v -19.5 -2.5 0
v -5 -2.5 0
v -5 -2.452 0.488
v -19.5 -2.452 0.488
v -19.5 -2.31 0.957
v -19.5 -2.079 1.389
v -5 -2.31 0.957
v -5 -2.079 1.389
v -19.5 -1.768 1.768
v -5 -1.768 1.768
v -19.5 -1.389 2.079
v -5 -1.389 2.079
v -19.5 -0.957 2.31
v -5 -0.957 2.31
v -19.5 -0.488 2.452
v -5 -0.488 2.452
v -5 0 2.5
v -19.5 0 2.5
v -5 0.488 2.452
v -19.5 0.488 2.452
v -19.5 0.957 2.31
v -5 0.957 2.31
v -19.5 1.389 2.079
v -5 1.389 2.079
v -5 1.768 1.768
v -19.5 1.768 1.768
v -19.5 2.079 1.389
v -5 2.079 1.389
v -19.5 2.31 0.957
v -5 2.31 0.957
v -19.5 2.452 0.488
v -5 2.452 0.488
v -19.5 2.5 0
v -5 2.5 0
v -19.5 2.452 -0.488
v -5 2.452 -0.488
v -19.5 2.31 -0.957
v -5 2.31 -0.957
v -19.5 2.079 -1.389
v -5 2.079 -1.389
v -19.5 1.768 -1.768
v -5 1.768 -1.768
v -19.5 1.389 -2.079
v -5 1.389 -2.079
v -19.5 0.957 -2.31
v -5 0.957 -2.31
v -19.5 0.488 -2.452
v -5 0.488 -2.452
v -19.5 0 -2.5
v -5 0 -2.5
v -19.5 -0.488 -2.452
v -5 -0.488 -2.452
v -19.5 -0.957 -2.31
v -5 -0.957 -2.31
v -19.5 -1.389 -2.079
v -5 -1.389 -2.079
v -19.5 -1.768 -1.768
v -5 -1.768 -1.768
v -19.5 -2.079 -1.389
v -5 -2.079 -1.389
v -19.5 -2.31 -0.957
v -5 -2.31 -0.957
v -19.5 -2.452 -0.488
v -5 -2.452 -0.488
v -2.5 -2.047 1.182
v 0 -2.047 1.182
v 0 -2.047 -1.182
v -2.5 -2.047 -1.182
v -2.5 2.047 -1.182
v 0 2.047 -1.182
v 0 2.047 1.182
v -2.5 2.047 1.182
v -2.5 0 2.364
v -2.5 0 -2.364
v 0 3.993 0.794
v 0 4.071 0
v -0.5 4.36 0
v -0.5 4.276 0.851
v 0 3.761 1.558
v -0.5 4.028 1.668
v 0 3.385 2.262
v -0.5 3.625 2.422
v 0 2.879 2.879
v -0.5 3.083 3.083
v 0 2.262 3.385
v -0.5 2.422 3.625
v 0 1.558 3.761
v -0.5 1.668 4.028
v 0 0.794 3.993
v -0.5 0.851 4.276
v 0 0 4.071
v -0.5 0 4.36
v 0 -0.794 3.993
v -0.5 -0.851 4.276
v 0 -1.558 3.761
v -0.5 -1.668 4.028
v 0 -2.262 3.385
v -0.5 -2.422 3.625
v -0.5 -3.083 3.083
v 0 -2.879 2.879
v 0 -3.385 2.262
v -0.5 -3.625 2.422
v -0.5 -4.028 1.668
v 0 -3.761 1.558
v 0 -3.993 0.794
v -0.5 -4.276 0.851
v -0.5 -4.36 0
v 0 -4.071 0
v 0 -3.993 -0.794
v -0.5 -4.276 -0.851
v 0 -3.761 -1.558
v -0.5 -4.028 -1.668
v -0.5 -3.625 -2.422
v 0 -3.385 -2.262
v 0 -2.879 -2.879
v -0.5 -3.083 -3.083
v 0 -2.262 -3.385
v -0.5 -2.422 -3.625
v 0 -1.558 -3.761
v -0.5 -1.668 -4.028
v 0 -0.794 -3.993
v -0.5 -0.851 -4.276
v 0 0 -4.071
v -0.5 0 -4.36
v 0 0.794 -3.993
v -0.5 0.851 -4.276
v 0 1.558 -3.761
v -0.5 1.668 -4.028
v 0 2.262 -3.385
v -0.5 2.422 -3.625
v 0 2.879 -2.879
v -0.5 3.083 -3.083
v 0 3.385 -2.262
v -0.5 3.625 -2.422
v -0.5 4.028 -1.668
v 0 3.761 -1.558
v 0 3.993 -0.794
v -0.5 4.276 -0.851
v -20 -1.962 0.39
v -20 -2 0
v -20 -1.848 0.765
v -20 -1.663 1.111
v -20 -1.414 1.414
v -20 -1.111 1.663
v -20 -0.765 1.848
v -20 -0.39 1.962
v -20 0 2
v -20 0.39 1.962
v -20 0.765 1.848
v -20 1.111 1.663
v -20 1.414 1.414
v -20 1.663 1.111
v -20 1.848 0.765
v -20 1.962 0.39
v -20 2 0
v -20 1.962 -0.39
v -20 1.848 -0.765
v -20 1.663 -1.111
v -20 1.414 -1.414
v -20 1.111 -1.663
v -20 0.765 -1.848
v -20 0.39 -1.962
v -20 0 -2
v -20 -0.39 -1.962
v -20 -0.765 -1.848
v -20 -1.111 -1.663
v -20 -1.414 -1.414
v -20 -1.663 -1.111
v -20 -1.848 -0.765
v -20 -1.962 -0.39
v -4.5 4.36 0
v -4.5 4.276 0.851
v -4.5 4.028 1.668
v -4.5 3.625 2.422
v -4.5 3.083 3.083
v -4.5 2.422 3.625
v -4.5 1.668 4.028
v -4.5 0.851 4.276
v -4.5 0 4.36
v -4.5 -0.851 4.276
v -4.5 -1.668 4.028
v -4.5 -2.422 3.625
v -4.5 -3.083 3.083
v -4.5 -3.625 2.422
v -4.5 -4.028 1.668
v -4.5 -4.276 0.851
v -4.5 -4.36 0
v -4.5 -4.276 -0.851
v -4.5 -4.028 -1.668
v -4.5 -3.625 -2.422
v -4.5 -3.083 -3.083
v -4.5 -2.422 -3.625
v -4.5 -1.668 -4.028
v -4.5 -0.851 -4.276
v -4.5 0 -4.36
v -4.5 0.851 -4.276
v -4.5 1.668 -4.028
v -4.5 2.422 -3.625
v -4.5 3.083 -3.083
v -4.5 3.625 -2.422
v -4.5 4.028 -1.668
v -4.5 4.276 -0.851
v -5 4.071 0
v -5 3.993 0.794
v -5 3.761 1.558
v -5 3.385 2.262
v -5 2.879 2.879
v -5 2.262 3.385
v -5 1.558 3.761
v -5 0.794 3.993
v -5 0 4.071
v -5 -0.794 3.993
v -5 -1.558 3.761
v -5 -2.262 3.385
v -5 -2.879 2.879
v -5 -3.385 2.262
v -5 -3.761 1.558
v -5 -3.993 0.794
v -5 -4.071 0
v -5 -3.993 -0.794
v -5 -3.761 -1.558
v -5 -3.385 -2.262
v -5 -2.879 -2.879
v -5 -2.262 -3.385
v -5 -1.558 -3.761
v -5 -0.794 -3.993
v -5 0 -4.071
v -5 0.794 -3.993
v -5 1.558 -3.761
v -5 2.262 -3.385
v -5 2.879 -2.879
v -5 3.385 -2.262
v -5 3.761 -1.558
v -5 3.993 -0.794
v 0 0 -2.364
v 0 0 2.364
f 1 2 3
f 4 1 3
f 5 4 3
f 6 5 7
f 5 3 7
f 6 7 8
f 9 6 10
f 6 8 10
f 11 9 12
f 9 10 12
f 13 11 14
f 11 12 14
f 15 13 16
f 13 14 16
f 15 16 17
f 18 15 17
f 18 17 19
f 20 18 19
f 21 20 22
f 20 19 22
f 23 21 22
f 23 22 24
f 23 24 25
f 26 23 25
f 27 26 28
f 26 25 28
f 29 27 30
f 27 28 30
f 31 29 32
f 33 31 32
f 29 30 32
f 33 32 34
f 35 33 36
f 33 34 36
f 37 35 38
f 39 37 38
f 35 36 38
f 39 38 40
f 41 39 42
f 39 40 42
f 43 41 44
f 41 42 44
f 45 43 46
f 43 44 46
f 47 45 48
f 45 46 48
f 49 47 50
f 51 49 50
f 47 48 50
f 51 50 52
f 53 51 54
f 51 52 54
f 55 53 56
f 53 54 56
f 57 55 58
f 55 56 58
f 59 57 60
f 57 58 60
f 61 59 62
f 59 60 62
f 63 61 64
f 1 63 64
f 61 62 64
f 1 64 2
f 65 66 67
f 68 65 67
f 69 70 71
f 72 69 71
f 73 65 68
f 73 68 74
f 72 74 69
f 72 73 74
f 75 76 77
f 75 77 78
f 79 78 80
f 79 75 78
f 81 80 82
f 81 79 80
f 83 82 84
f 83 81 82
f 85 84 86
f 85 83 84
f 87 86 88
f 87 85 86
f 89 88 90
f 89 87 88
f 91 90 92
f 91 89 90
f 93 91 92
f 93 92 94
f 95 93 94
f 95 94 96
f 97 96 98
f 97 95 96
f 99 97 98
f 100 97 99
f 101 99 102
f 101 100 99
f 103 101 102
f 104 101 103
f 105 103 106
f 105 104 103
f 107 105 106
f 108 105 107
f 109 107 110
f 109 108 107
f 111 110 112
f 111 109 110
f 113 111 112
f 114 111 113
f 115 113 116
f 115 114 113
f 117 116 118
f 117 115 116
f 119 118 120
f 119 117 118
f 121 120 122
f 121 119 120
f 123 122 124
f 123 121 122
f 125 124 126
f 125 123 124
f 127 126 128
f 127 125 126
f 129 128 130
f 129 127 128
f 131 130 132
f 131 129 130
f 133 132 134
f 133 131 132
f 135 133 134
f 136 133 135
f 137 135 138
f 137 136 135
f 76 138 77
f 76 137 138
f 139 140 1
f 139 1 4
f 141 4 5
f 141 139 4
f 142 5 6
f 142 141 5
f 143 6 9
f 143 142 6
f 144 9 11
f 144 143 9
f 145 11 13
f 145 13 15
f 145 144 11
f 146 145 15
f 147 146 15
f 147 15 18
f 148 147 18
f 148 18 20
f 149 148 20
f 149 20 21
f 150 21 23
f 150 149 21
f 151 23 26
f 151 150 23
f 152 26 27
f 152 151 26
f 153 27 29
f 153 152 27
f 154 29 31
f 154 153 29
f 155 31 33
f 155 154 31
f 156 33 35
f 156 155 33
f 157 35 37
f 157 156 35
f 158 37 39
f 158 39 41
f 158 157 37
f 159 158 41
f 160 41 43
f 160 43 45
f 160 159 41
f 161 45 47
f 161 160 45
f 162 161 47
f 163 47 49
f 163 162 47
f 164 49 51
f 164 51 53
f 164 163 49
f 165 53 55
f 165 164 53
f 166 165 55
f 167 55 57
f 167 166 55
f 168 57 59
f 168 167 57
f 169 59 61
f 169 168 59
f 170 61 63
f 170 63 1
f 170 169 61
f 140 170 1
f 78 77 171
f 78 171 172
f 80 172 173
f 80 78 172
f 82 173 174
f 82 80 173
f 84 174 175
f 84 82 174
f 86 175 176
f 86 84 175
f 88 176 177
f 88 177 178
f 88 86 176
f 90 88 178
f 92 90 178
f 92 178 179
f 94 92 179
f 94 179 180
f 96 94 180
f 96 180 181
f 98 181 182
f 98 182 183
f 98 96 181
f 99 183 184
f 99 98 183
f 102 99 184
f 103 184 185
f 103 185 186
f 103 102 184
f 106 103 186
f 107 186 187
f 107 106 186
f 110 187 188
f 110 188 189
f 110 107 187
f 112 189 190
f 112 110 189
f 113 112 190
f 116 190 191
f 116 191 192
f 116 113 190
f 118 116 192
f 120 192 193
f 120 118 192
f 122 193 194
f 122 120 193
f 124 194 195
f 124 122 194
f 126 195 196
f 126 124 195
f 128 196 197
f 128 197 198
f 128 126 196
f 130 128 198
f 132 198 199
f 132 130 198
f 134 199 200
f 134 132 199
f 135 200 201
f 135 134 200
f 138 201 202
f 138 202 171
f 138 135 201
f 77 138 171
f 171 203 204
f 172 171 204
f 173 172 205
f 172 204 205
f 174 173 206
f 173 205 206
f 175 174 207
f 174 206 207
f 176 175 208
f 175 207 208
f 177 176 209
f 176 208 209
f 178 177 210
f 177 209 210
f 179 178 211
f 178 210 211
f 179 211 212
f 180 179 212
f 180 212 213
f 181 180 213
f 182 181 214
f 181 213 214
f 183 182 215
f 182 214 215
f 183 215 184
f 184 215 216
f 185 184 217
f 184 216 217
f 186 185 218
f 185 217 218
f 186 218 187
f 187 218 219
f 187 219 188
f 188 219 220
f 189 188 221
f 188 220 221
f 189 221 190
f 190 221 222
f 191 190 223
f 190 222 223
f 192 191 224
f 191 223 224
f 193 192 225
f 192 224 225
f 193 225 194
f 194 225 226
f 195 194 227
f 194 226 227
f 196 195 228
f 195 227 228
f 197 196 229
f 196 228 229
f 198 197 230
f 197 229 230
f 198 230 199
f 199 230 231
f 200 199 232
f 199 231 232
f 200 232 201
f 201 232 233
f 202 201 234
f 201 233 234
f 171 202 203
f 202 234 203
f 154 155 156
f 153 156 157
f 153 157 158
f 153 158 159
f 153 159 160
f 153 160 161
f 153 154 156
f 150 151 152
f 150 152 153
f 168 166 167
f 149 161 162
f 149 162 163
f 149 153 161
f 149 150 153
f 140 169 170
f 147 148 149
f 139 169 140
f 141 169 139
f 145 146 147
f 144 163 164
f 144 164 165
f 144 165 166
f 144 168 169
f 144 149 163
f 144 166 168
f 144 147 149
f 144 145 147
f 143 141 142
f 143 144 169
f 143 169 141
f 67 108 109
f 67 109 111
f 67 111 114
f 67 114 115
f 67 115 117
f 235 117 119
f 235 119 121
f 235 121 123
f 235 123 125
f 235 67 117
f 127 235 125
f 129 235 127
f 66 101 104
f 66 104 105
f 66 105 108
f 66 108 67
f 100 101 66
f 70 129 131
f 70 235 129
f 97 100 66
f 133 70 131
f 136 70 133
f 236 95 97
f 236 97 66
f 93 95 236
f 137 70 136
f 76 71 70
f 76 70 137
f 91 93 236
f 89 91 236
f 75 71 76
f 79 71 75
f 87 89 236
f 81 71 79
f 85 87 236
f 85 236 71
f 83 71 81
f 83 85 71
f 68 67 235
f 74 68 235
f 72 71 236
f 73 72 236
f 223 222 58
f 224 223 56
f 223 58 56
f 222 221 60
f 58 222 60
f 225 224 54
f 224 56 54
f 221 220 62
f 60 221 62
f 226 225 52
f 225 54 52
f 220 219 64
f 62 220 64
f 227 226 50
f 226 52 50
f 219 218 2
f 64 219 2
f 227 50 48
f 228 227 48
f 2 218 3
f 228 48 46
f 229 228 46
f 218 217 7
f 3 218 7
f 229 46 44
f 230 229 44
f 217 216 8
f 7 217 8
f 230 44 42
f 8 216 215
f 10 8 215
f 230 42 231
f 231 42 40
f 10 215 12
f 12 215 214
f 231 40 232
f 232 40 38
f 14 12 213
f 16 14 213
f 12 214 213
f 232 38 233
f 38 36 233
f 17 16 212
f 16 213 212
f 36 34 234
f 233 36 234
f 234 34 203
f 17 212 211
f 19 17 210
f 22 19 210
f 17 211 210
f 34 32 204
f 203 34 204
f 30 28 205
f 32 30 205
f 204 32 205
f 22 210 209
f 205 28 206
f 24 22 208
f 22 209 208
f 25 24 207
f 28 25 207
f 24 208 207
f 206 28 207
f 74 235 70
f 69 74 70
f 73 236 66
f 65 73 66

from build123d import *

# Parameters (mm, degrees)
F0_R     = 4.36
F1_DEPTH = 5
F2_SIZE2 = 0.288675
F2_SIZE  = 0.5
F4_DEPTH = 2.5
F5_R     = 2.5
F6_DEPTH = 15
F7_SIZE  = 0.5


with BuildPart() as f1:
    # F0 (on Right) → F1 (new body)
    with BuildSketch(Plane.YZ):
        Circle(F0_R)
    extrude(amount=-F1_DEPTH)

    # F2
    f2_edges = [f1.edges().sort_by_distance(p)[0] for p in [
        (0, -4.36, 0),
        (-5, -4.36, 0),
    ]]
    chamfer(f2_edges, length=F2_SIZE, length2=F2_SIZE2)

    # F3 (on face) → F4 (cut)
    with BuildSketch(Plane.YZ):
        Polygon((0, -2.364249), (2.0475, -1.182125), (2.0475, 1.182125), (0, 2.364249), (-2.0475, 1.182125), (-2.0475, -1.182125), align=None)
    extrude(amount=-F4_DEPTH, mode=Mode.SUBTRACT)

    # F5 (on face) → F6 (join)
    with BuildSketch(Plane(origin=(-5, 0, 0), x_dir=(0, -1, 0), z_dir=(-1, 0, 0))):
        Circle(F5_R)
    extrude(amount=F6_DEPTH)

    # F7
    f7_edges = [f1.edges().sort_by_distance(p)[0] for p in [
        (-20, 2.5, 0),
    ]]
    chamfer(f7_edges, length=F7_SIZE)


solid = f1.part
